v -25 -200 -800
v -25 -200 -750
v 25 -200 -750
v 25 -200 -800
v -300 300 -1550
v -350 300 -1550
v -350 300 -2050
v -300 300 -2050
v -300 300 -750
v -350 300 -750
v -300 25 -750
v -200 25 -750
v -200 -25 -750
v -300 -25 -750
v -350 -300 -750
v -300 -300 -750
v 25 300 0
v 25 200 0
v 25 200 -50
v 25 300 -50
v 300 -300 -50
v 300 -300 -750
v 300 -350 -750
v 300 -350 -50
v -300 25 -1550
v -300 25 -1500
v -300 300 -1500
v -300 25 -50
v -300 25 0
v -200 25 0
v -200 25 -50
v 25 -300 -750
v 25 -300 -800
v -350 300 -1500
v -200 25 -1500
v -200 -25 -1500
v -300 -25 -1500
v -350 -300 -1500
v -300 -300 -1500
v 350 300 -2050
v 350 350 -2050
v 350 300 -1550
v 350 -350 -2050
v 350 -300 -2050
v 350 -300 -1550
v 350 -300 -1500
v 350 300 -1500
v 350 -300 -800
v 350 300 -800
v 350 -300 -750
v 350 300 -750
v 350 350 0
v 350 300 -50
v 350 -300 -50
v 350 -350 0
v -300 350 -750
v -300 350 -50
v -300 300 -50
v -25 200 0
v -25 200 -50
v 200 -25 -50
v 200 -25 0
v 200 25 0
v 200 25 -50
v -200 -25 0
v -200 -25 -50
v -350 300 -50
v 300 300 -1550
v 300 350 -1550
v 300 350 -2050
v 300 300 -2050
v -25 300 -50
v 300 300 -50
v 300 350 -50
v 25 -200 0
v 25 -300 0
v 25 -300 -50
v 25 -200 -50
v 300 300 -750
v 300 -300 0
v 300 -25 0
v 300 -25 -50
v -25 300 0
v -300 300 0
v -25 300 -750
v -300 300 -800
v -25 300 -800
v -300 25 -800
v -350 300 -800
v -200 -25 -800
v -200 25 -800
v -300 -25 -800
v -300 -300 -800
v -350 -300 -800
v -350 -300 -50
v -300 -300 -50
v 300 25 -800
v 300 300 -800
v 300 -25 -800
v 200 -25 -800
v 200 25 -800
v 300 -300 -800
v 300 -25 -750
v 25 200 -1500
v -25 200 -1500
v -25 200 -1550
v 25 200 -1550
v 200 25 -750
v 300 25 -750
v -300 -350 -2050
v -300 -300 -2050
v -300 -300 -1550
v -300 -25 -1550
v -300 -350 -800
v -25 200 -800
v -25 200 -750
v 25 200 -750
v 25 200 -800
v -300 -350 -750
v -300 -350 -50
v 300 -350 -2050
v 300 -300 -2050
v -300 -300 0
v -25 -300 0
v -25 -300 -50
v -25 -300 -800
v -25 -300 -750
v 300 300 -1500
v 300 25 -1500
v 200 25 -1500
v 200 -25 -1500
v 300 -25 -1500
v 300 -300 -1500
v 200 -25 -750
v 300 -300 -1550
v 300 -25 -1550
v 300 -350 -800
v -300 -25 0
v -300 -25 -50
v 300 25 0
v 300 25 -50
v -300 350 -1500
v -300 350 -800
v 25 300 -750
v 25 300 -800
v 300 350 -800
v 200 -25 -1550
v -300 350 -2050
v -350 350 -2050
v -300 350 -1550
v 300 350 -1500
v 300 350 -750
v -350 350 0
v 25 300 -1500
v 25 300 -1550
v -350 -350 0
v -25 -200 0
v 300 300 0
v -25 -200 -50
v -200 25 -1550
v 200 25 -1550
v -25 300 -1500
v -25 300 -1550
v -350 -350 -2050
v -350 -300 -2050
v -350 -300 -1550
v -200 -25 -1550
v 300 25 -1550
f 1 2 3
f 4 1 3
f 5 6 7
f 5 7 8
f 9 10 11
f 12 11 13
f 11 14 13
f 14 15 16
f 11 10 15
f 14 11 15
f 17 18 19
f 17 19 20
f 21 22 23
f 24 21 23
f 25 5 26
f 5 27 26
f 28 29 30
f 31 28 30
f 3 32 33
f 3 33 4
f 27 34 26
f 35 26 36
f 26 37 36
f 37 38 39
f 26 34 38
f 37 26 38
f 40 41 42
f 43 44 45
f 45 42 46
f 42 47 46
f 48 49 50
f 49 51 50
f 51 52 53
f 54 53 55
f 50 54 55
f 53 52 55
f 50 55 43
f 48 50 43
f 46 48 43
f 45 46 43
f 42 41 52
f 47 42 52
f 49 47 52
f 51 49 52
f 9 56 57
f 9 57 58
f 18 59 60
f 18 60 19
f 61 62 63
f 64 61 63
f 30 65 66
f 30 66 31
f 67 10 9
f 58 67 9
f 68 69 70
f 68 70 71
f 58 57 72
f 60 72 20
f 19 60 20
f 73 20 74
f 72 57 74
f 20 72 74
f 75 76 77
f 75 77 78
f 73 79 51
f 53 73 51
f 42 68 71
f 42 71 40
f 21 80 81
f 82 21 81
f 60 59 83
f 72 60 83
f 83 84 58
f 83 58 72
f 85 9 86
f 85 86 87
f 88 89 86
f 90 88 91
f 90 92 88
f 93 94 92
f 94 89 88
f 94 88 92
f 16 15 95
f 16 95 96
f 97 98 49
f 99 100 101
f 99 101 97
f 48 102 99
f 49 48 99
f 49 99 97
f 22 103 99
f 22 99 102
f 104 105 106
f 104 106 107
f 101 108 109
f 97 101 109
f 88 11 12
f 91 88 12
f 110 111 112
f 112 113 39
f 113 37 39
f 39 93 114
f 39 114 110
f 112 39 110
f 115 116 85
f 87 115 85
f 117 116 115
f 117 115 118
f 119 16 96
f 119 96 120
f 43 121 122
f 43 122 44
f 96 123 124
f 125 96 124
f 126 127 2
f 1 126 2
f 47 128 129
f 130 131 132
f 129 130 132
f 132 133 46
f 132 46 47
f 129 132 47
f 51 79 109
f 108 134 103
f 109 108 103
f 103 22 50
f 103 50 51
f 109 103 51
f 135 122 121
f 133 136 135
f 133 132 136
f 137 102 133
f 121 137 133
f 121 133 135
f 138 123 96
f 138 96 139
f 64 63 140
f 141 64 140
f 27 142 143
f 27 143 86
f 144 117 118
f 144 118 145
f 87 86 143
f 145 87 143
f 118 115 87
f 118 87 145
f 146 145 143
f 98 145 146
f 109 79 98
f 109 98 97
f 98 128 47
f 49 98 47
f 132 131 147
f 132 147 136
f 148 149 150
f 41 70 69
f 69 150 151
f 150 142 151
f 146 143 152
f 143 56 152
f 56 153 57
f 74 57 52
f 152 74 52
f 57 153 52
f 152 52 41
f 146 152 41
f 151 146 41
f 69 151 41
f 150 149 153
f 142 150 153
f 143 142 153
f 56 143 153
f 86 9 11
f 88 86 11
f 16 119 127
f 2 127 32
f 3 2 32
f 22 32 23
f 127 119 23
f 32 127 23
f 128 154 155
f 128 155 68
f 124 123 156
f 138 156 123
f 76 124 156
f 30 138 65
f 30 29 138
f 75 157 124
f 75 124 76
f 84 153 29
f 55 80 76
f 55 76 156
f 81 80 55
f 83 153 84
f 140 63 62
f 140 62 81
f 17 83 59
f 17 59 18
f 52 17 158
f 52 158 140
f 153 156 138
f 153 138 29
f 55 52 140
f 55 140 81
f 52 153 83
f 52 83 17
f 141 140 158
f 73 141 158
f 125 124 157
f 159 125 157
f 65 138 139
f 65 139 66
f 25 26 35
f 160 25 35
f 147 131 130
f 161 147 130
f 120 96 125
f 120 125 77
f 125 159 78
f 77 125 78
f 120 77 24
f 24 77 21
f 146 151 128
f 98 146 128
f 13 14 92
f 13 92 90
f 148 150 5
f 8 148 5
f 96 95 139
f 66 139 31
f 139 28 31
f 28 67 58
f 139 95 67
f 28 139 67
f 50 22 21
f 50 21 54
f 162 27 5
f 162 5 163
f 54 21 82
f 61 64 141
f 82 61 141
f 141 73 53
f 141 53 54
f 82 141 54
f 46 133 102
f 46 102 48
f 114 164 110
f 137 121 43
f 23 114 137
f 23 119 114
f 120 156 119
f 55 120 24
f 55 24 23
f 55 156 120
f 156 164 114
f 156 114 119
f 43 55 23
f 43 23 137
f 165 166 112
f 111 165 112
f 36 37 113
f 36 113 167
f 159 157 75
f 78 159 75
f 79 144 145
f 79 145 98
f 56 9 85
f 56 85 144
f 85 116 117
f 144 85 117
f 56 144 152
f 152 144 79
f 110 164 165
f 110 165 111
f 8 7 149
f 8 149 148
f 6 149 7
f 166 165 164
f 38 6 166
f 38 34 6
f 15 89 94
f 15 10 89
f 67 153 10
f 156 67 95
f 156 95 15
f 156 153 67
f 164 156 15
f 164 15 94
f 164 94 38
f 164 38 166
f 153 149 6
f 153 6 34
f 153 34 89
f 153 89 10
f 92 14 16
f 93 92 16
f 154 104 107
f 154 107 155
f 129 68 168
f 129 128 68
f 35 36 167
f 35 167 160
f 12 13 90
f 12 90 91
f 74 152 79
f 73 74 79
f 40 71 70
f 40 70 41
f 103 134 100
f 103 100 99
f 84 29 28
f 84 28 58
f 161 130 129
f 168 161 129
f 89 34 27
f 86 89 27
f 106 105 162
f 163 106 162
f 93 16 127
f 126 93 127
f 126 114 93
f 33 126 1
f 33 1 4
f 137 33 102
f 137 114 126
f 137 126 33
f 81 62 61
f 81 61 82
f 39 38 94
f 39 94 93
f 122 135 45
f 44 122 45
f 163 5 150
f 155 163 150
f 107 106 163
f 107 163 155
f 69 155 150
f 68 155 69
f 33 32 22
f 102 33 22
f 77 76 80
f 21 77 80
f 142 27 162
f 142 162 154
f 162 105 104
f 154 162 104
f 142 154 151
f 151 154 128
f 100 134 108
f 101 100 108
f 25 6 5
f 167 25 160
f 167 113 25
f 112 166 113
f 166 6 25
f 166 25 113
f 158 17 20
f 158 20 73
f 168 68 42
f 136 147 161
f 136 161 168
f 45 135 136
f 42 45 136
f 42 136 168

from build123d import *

# Parameters (mm, degrees)
F0_W      = 700
F0_H      = 700
F0_W_2    = 600
F0_H_2    = 600
F1_DEPTH  = 50
F2_W      = 50
F2_H      = 50
F3_DEPTH  = 700
F4_W      = 700
F4_H      = 700
F4_W_2    = 600
F4_H_2    = 600
F5_DEPTH  = 50
F6_W      = 100
F6_H      = 50
F6_W_2    = 50
F6_H_2    = 100
F7_DEPTH  = 50
F8_W      = 50
F8_H      = 50
F9_DEPTH  = 700
F10_W     = 700
F10_H     = 700
F10_W_2   = 600
F10_H_2   = 600
F11_DEPTH = 50
F12_W     = 50
F12_H     = 50
F13_DEPTH = 500
F14_W     = 100
F14_H     = 50
F14_W_2   = 50
F14_H_2   = 100
F15_DEPTH = 50
F16_W     = 600
F16_H     = 50
F17_DEPTH = 50
F18_W     = 100
F18_H     = 50
F18_W_2   = 50
F18_H_2   = 100
F19_DEPTH = 50


with BuildPart() as f1:
    # F0 (on Top) → F1 (new body)
    with BuildSketch(Plane.XY):
        Rectangle(F0_W, F0_H)
        Rectangle(F0_W_2, F0_H_2, mode=Mode.SUBTRACT)
    extrude(amount=-F1_DEPTH)

    # F2 (on face) → F3 (join)
    with BuildSketch(Plane(origin=(0, 0, -50), x_dir=(1, 0, 0), z_dir=(0, 0, -1))):
        with Locations((-325, 325)):
            Rectangle(F2_W, F2_H)
        with Locations((325, 325)):
            Rectangle(F2_W, F2_H)
        with Locations((325, -325)):
            Rectangle(F2_W, F2_H)
        with Locations((-325, -325)):
            Rectangle(F2_W, F2_H)
    extrude(amount=F3_DEPTH)

    # F4 (on face) → F5 (join)
    with BuildSketch(Plane(origin=(0, 0, -750), x_dir=(1, 0, 0), z_dir=(0, 0, -1))):
        Rectangle(F4_W, F4_H)
        Rectangle(F4_W_2, F4_H_2, mode=Mode.SUBTRACT)
    extrude(amount=F5_DEPTH)

    # F6 (on face) → F7 (join)
    with BuildSketch(Plane.XY):
        with Locations((-250, 0)):
            Rectangle(F6_W, F6_H)
        with Locations((0, -250)):
            Rectangle(F6_W_2, F6_H_2)
        with Locations((250, 0)):
            Rectangle(F6_W, F6_H)
        with Locations((0, 250)):
            Rectangle(F6_W_2, F6_H_2)
    extrude(amount=-F7_DEPTH)

    # F8 (on face) → F9 (join)
    with BuildSketch(Plane(origin=(0, 0, -800), x_dir=(1, 0, 0), z_dir=(0, 0, -1))):
        with Locations((-325, 325)):
            Rectangle(F8_W, F8_H)
        with Locations((325, 325)):
            Rectangle(F8_W, F8_H)
        with Locations((-325, -325)):
            Rectangle(F8_W, F8_H)
        with Locations((325, -325)):
            Rectangle(F8_W, F8_H)
    extrude(amount=F9_DEPTH)

    # F10 (on face) → F11 (join)
    with BuildSketch(Plane(origin=(0, 0, -1500), x_dir=(1, 0, 0), z_dir=(0, 0, -1))):
        Rectangle(F10_W, F10_H)
        Rectangle(F10_W_2, F10_H_2, mode=Mode.SUBTRACT)
    extrude(amount=F11_DEPTH)

    # F12 (on face) → F13 (join)
    with BuildSketch(Plane(origin=(0, 0, -1550), x_dir=(1, 0, 0), z_dir=(0, 0, -1))):
        with Locations((-325, 325)):
            Rectangle(F12_W, F12_H)
        with Locations((325, 325)):
            Rectangle(F12_W, F12_H)
        with Locations((-325, -325)):
            Rectangle(F12_W, F12_H)
        with Locations((325, -325)):
            Rectangle(F12_W, F12_H)
    extrude(amount=F13_DEPTH)

    # F14 (on face) → F15 (join)
    with BuildSketch(Plane.XY.offset(-750)):
        with Locations((-250, 0)):
            Rectangle(F14_W, F14_H)
        with Locations((0, -250)):
            Rectangle(F14_W_2, F14_H_2)
        with Locations((250, 0)):
            Rectangle(F14_W, F14_H)
        with Locations((0, 250)):
            Rectangle(F14_W_2, F14_H_2)
    extrude(amount=-F15_DEPTH)

    # F16 (on face) → F17 (cut, through all)
    with BuildSketch(Plane.XY.offset(-1500)):
        with Locations((0, -325)):
            Rectangle(F16_W, F16_H)
    extrude(amount=-F17_DEPTH, mode=Mode.SUBTRACT)

    # F18 (on face) → F19 (join)
    with BuildSketch(Plane.XY.offset(-1500)):
        with Locations((-250, 0)):
            Rectangle(F18_W, F18_H)
        with Locations((250, 0)):
            Rectangle(F18_W, F18_H)
        with Locations((0, 250)):
            Rectangle(F18_W_2, F18_H_2)
    extrude(amount=-F19_DEPTH)


solid = f1.part
